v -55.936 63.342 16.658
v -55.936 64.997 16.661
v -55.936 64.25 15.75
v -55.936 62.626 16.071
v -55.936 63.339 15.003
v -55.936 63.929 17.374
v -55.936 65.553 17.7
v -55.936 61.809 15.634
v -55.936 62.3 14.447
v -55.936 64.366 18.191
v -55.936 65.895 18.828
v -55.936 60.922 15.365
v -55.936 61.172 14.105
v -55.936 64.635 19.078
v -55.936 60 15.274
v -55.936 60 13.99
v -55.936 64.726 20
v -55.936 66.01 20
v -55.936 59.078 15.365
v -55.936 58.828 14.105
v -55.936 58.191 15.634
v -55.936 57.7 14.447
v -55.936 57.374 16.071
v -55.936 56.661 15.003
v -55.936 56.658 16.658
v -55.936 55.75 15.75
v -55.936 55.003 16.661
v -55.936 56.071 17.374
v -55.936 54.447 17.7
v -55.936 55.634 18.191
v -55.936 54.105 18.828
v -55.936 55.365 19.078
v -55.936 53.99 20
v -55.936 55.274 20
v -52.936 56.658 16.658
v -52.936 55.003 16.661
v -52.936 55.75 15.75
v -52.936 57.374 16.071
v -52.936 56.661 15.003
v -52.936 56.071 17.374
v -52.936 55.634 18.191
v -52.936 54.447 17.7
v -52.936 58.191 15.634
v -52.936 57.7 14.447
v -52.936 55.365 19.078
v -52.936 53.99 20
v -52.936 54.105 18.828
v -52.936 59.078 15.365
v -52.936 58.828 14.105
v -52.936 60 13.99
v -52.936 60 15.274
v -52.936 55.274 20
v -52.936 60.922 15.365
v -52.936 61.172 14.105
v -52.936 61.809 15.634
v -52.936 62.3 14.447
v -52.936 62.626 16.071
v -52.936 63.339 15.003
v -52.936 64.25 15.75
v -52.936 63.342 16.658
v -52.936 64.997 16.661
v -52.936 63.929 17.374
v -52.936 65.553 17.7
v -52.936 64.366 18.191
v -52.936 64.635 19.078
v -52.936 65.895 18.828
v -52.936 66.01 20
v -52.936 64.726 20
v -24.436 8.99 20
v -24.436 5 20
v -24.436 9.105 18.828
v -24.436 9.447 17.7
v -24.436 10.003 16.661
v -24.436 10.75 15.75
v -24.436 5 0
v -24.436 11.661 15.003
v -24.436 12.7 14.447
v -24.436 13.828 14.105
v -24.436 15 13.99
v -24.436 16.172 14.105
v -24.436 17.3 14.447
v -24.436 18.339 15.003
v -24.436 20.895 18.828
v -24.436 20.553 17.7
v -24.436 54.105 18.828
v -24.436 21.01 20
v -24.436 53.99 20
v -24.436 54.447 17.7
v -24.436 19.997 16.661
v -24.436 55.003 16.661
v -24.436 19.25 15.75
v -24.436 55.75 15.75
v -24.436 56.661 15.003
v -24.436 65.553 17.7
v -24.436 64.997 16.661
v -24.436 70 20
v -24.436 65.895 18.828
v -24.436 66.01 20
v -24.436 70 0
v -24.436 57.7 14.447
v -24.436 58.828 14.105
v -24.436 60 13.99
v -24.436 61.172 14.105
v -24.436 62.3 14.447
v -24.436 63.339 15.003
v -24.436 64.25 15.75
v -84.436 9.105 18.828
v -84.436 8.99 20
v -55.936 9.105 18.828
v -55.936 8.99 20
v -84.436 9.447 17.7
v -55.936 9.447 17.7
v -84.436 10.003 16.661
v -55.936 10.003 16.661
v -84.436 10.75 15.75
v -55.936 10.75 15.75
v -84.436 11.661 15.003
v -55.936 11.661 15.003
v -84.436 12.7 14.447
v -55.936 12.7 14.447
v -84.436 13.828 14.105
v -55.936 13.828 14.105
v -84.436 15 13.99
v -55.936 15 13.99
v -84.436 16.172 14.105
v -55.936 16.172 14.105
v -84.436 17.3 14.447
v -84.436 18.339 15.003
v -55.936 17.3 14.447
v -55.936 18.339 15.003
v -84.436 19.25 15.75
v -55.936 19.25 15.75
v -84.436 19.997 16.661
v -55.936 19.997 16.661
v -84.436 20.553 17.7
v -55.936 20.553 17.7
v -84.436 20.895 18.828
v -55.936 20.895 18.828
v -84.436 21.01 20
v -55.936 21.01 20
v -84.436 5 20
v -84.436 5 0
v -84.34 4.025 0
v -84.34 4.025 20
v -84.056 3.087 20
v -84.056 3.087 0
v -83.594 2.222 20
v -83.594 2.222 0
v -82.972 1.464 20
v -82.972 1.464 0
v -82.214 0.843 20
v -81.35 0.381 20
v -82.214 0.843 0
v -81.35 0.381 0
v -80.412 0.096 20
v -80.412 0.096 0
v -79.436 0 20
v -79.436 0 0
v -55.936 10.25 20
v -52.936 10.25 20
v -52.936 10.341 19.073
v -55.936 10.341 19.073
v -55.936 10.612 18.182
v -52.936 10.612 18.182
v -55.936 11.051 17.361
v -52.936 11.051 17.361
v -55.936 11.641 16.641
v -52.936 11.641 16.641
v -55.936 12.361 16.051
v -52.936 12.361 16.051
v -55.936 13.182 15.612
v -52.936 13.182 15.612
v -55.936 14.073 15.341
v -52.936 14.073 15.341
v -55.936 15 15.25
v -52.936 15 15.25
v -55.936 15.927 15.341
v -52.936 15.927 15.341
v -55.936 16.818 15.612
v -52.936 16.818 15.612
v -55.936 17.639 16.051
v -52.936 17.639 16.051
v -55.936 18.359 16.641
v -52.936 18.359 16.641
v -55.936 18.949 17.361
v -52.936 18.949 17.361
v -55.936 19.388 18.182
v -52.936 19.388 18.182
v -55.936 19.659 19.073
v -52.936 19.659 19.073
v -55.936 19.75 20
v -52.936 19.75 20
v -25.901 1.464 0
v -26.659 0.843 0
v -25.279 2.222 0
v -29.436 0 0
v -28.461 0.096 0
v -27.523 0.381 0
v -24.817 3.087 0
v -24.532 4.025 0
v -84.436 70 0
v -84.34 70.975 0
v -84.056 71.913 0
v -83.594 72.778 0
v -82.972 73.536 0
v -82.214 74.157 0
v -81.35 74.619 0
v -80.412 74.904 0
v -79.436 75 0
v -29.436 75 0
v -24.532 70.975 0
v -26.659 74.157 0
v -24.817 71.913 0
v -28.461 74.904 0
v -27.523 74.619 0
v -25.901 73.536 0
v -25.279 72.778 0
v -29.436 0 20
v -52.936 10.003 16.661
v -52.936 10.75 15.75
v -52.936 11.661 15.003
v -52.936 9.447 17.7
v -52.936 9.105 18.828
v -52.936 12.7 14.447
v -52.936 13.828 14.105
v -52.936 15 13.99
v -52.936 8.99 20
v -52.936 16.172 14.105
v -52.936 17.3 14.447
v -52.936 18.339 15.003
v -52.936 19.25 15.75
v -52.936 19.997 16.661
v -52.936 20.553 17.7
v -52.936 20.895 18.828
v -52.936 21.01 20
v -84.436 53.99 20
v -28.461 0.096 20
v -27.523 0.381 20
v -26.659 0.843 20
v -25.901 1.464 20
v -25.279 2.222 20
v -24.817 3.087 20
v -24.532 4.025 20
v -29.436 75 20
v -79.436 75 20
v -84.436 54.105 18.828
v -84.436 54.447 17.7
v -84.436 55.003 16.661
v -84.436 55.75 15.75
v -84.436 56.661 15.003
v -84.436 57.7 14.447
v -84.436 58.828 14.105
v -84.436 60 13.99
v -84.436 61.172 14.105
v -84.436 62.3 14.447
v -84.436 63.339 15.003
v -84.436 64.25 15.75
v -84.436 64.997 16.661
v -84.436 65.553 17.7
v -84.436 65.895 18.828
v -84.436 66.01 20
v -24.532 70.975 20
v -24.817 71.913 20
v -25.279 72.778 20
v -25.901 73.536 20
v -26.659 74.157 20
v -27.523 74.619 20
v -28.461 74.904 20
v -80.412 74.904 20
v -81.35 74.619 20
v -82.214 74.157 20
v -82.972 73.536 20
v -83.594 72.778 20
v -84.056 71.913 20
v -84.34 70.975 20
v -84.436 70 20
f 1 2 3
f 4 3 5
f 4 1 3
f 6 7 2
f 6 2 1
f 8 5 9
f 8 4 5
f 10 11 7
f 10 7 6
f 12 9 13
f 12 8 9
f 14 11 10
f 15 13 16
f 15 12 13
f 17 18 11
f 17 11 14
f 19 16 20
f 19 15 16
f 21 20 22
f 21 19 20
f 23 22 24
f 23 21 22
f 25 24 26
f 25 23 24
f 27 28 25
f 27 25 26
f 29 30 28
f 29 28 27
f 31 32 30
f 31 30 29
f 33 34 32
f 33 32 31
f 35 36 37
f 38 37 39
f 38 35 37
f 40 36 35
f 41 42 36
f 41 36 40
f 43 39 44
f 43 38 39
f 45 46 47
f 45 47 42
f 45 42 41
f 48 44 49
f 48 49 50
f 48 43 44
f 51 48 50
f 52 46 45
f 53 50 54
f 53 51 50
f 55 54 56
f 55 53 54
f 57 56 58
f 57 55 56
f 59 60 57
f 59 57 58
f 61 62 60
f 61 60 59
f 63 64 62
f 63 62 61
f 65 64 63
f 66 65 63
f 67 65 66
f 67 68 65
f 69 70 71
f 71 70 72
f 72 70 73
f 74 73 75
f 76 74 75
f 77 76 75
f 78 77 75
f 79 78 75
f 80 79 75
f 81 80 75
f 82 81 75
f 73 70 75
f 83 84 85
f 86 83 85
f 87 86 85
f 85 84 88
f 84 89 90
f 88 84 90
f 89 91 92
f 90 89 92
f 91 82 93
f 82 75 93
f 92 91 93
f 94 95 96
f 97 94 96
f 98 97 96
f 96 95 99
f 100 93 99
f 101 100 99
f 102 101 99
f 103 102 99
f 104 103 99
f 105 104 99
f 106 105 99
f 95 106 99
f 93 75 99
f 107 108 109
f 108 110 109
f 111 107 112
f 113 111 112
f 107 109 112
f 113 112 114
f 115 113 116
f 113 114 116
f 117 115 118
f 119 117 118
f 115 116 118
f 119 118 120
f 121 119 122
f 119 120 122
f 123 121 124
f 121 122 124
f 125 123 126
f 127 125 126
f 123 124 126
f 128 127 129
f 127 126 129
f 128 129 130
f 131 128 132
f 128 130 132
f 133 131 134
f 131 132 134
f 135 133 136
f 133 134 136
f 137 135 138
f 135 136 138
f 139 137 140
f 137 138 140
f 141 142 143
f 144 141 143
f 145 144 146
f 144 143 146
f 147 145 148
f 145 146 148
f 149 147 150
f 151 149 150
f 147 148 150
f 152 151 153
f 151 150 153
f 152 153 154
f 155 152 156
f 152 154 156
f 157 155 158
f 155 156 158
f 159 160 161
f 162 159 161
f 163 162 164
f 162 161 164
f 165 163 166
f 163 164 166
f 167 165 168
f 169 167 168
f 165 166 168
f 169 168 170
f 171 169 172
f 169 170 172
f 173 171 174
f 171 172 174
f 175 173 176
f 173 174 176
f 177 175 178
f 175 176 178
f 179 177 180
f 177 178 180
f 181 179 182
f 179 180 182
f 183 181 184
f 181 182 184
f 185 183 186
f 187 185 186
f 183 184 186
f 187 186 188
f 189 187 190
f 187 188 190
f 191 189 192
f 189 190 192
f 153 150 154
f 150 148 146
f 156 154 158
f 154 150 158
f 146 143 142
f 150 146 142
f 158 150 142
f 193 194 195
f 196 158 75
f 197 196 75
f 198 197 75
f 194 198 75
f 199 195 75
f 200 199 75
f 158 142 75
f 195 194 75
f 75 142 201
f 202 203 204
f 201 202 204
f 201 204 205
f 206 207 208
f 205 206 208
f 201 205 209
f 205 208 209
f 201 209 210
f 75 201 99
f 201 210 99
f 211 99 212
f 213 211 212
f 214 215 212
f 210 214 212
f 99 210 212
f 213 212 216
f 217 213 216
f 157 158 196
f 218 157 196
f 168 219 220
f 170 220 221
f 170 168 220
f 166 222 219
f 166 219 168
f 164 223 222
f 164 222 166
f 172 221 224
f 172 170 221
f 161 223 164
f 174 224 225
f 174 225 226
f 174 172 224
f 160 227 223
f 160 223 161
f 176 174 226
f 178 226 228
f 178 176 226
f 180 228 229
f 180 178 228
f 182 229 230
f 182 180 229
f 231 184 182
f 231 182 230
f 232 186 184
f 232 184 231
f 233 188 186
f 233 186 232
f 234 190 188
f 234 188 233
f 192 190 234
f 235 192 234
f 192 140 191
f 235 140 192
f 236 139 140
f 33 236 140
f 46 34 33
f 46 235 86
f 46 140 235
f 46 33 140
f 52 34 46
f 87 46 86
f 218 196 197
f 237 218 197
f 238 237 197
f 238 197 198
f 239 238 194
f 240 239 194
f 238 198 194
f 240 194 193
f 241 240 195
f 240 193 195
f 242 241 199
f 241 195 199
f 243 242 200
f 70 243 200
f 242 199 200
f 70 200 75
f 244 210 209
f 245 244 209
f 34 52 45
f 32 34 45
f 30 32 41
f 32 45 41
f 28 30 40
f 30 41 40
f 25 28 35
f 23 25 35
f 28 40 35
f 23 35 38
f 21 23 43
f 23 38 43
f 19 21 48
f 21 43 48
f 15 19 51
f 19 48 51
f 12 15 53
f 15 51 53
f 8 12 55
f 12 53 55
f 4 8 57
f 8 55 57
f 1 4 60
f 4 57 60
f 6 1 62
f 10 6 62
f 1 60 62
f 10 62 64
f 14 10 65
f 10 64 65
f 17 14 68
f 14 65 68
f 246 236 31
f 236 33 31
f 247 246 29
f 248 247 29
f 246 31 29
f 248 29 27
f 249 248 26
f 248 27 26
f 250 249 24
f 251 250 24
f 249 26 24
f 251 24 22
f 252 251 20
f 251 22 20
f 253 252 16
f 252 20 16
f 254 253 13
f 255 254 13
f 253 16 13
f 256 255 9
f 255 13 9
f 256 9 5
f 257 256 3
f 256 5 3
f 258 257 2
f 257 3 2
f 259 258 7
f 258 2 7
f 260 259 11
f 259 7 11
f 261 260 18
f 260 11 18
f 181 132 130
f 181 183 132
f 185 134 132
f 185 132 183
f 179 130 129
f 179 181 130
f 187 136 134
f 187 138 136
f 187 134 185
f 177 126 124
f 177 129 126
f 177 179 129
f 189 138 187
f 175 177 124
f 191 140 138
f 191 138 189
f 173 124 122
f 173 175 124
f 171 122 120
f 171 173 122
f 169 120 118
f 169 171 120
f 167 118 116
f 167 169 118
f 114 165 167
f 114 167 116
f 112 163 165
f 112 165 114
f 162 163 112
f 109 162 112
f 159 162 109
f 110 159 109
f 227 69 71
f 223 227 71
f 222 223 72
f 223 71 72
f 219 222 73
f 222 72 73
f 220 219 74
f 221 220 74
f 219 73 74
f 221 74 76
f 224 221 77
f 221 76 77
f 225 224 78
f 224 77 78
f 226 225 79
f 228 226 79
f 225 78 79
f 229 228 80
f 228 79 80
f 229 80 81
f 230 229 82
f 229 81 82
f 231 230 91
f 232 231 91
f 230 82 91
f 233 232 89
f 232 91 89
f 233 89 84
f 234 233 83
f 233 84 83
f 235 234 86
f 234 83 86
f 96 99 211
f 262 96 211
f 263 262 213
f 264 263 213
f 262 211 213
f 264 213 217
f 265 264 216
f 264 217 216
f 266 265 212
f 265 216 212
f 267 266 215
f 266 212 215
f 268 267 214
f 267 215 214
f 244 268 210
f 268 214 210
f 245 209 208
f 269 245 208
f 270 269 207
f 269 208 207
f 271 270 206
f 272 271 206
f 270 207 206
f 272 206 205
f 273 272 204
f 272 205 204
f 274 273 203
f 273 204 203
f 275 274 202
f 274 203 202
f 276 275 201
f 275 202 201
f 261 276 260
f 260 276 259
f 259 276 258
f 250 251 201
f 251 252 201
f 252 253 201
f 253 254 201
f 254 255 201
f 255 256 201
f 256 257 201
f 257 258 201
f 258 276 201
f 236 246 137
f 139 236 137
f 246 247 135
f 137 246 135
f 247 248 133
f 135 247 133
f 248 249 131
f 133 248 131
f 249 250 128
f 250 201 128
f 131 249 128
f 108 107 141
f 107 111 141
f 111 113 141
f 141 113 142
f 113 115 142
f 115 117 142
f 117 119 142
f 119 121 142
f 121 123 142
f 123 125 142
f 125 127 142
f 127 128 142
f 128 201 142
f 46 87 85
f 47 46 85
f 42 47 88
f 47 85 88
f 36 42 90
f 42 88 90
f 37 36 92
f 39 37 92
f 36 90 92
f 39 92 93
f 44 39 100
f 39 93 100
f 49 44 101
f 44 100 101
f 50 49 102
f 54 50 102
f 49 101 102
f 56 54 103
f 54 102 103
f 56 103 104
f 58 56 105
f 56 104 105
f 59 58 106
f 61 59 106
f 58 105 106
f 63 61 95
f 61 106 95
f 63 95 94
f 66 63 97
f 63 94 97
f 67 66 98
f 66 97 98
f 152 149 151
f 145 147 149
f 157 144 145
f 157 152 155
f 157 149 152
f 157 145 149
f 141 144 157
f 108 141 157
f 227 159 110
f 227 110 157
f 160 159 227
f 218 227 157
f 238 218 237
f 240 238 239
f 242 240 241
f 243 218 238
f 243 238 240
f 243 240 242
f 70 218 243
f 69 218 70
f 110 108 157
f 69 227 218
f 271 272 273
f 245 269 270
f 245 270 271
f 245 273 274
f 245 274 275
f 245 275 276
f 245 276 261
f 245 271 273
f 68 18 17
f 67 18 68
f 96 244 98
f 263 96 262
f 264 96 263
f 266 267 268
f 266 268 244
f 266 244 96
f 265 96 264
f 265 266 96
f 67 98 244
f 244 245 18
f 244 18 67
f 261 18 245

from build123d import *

# Parameters (mm, degrees)
F1_DEPTH = 20
F2_R     = 6.01
F3_DEPTH = 60.001
F5_DEPTH = 7
F6_R     = 4.725935
F6_R_2   = 4.75
F7_DEPTH = 60.001


with BuildPart() as f1:
    # F0 (on Top) → F1 (new body)
    with BuildSketch(Plane.XY):
        with BuildLine():
            Line((-29.436361, 75), (-79.436361, 75))
            ThreePointArc((-79.436361, 75), (-82.971895, 73.535534), (-84.436361, 70))
            Line((-84.436361, 70), (-84.436361, 5))
            ThreePointArc((-84.436361, 5), (-82.971895, 1.464466), (-79.436361, 0))
            Line((-79.436361, 0), (-29.436361, 0))
            ThreePointArc((-29.436361, 0), (-25.900827, 1.464466), (-24.436361, 5))
            Line((-24.436361, 5), (-24.436361, 70))
            ThreePointArc((-24.436361, 70), (-25.900827, 73.535534), (-29.436361, 75))
        make_face()
    extrude(amount=F1_DEPTH)

    # F2 (on face) → F3 (cut, through all)
    with BuildSketch(Plane.YZ.offset(-24.436361)):
        with Locations((60, 20)):
            Circle(F2_R)
        with Locations((15, 20)):
            Circle(F2_R)
    extrude(amount=-F3_DEPTH, mode=Mode.SUBTRACT)

    # F4 (on face) → F5 (join)
    with BuildSketch(Plane.XY.offset(20)):
        Polygon((-55.936361, 53.99), (-54.436361, 53.99), (-52.936361, 53.99), (-52.936361, 66.01), (-55.936361, 66.01), align=None)
        Polygon((-52.936361, 21.01), (-54.436361, 21.01), (-55.936361, 21.01), (-55.936361, 8.828274), (-52.936361, 8.828274), align=None)
    extrude(amount=-F5_DEPTH)

    # F6 (on face) → F7 (cut, through all)
    with BuildSketch(Plane.YZ.offset(-24.436361)):
        with Locations((60, 20)):
            Circle(F6_R)
        with Locations((15, 20)):
            Circle(F6_R_2)
    extrude(amount=-F7_DEPTH, mode=Mode.SUBTRACT)


solid = f1.part
